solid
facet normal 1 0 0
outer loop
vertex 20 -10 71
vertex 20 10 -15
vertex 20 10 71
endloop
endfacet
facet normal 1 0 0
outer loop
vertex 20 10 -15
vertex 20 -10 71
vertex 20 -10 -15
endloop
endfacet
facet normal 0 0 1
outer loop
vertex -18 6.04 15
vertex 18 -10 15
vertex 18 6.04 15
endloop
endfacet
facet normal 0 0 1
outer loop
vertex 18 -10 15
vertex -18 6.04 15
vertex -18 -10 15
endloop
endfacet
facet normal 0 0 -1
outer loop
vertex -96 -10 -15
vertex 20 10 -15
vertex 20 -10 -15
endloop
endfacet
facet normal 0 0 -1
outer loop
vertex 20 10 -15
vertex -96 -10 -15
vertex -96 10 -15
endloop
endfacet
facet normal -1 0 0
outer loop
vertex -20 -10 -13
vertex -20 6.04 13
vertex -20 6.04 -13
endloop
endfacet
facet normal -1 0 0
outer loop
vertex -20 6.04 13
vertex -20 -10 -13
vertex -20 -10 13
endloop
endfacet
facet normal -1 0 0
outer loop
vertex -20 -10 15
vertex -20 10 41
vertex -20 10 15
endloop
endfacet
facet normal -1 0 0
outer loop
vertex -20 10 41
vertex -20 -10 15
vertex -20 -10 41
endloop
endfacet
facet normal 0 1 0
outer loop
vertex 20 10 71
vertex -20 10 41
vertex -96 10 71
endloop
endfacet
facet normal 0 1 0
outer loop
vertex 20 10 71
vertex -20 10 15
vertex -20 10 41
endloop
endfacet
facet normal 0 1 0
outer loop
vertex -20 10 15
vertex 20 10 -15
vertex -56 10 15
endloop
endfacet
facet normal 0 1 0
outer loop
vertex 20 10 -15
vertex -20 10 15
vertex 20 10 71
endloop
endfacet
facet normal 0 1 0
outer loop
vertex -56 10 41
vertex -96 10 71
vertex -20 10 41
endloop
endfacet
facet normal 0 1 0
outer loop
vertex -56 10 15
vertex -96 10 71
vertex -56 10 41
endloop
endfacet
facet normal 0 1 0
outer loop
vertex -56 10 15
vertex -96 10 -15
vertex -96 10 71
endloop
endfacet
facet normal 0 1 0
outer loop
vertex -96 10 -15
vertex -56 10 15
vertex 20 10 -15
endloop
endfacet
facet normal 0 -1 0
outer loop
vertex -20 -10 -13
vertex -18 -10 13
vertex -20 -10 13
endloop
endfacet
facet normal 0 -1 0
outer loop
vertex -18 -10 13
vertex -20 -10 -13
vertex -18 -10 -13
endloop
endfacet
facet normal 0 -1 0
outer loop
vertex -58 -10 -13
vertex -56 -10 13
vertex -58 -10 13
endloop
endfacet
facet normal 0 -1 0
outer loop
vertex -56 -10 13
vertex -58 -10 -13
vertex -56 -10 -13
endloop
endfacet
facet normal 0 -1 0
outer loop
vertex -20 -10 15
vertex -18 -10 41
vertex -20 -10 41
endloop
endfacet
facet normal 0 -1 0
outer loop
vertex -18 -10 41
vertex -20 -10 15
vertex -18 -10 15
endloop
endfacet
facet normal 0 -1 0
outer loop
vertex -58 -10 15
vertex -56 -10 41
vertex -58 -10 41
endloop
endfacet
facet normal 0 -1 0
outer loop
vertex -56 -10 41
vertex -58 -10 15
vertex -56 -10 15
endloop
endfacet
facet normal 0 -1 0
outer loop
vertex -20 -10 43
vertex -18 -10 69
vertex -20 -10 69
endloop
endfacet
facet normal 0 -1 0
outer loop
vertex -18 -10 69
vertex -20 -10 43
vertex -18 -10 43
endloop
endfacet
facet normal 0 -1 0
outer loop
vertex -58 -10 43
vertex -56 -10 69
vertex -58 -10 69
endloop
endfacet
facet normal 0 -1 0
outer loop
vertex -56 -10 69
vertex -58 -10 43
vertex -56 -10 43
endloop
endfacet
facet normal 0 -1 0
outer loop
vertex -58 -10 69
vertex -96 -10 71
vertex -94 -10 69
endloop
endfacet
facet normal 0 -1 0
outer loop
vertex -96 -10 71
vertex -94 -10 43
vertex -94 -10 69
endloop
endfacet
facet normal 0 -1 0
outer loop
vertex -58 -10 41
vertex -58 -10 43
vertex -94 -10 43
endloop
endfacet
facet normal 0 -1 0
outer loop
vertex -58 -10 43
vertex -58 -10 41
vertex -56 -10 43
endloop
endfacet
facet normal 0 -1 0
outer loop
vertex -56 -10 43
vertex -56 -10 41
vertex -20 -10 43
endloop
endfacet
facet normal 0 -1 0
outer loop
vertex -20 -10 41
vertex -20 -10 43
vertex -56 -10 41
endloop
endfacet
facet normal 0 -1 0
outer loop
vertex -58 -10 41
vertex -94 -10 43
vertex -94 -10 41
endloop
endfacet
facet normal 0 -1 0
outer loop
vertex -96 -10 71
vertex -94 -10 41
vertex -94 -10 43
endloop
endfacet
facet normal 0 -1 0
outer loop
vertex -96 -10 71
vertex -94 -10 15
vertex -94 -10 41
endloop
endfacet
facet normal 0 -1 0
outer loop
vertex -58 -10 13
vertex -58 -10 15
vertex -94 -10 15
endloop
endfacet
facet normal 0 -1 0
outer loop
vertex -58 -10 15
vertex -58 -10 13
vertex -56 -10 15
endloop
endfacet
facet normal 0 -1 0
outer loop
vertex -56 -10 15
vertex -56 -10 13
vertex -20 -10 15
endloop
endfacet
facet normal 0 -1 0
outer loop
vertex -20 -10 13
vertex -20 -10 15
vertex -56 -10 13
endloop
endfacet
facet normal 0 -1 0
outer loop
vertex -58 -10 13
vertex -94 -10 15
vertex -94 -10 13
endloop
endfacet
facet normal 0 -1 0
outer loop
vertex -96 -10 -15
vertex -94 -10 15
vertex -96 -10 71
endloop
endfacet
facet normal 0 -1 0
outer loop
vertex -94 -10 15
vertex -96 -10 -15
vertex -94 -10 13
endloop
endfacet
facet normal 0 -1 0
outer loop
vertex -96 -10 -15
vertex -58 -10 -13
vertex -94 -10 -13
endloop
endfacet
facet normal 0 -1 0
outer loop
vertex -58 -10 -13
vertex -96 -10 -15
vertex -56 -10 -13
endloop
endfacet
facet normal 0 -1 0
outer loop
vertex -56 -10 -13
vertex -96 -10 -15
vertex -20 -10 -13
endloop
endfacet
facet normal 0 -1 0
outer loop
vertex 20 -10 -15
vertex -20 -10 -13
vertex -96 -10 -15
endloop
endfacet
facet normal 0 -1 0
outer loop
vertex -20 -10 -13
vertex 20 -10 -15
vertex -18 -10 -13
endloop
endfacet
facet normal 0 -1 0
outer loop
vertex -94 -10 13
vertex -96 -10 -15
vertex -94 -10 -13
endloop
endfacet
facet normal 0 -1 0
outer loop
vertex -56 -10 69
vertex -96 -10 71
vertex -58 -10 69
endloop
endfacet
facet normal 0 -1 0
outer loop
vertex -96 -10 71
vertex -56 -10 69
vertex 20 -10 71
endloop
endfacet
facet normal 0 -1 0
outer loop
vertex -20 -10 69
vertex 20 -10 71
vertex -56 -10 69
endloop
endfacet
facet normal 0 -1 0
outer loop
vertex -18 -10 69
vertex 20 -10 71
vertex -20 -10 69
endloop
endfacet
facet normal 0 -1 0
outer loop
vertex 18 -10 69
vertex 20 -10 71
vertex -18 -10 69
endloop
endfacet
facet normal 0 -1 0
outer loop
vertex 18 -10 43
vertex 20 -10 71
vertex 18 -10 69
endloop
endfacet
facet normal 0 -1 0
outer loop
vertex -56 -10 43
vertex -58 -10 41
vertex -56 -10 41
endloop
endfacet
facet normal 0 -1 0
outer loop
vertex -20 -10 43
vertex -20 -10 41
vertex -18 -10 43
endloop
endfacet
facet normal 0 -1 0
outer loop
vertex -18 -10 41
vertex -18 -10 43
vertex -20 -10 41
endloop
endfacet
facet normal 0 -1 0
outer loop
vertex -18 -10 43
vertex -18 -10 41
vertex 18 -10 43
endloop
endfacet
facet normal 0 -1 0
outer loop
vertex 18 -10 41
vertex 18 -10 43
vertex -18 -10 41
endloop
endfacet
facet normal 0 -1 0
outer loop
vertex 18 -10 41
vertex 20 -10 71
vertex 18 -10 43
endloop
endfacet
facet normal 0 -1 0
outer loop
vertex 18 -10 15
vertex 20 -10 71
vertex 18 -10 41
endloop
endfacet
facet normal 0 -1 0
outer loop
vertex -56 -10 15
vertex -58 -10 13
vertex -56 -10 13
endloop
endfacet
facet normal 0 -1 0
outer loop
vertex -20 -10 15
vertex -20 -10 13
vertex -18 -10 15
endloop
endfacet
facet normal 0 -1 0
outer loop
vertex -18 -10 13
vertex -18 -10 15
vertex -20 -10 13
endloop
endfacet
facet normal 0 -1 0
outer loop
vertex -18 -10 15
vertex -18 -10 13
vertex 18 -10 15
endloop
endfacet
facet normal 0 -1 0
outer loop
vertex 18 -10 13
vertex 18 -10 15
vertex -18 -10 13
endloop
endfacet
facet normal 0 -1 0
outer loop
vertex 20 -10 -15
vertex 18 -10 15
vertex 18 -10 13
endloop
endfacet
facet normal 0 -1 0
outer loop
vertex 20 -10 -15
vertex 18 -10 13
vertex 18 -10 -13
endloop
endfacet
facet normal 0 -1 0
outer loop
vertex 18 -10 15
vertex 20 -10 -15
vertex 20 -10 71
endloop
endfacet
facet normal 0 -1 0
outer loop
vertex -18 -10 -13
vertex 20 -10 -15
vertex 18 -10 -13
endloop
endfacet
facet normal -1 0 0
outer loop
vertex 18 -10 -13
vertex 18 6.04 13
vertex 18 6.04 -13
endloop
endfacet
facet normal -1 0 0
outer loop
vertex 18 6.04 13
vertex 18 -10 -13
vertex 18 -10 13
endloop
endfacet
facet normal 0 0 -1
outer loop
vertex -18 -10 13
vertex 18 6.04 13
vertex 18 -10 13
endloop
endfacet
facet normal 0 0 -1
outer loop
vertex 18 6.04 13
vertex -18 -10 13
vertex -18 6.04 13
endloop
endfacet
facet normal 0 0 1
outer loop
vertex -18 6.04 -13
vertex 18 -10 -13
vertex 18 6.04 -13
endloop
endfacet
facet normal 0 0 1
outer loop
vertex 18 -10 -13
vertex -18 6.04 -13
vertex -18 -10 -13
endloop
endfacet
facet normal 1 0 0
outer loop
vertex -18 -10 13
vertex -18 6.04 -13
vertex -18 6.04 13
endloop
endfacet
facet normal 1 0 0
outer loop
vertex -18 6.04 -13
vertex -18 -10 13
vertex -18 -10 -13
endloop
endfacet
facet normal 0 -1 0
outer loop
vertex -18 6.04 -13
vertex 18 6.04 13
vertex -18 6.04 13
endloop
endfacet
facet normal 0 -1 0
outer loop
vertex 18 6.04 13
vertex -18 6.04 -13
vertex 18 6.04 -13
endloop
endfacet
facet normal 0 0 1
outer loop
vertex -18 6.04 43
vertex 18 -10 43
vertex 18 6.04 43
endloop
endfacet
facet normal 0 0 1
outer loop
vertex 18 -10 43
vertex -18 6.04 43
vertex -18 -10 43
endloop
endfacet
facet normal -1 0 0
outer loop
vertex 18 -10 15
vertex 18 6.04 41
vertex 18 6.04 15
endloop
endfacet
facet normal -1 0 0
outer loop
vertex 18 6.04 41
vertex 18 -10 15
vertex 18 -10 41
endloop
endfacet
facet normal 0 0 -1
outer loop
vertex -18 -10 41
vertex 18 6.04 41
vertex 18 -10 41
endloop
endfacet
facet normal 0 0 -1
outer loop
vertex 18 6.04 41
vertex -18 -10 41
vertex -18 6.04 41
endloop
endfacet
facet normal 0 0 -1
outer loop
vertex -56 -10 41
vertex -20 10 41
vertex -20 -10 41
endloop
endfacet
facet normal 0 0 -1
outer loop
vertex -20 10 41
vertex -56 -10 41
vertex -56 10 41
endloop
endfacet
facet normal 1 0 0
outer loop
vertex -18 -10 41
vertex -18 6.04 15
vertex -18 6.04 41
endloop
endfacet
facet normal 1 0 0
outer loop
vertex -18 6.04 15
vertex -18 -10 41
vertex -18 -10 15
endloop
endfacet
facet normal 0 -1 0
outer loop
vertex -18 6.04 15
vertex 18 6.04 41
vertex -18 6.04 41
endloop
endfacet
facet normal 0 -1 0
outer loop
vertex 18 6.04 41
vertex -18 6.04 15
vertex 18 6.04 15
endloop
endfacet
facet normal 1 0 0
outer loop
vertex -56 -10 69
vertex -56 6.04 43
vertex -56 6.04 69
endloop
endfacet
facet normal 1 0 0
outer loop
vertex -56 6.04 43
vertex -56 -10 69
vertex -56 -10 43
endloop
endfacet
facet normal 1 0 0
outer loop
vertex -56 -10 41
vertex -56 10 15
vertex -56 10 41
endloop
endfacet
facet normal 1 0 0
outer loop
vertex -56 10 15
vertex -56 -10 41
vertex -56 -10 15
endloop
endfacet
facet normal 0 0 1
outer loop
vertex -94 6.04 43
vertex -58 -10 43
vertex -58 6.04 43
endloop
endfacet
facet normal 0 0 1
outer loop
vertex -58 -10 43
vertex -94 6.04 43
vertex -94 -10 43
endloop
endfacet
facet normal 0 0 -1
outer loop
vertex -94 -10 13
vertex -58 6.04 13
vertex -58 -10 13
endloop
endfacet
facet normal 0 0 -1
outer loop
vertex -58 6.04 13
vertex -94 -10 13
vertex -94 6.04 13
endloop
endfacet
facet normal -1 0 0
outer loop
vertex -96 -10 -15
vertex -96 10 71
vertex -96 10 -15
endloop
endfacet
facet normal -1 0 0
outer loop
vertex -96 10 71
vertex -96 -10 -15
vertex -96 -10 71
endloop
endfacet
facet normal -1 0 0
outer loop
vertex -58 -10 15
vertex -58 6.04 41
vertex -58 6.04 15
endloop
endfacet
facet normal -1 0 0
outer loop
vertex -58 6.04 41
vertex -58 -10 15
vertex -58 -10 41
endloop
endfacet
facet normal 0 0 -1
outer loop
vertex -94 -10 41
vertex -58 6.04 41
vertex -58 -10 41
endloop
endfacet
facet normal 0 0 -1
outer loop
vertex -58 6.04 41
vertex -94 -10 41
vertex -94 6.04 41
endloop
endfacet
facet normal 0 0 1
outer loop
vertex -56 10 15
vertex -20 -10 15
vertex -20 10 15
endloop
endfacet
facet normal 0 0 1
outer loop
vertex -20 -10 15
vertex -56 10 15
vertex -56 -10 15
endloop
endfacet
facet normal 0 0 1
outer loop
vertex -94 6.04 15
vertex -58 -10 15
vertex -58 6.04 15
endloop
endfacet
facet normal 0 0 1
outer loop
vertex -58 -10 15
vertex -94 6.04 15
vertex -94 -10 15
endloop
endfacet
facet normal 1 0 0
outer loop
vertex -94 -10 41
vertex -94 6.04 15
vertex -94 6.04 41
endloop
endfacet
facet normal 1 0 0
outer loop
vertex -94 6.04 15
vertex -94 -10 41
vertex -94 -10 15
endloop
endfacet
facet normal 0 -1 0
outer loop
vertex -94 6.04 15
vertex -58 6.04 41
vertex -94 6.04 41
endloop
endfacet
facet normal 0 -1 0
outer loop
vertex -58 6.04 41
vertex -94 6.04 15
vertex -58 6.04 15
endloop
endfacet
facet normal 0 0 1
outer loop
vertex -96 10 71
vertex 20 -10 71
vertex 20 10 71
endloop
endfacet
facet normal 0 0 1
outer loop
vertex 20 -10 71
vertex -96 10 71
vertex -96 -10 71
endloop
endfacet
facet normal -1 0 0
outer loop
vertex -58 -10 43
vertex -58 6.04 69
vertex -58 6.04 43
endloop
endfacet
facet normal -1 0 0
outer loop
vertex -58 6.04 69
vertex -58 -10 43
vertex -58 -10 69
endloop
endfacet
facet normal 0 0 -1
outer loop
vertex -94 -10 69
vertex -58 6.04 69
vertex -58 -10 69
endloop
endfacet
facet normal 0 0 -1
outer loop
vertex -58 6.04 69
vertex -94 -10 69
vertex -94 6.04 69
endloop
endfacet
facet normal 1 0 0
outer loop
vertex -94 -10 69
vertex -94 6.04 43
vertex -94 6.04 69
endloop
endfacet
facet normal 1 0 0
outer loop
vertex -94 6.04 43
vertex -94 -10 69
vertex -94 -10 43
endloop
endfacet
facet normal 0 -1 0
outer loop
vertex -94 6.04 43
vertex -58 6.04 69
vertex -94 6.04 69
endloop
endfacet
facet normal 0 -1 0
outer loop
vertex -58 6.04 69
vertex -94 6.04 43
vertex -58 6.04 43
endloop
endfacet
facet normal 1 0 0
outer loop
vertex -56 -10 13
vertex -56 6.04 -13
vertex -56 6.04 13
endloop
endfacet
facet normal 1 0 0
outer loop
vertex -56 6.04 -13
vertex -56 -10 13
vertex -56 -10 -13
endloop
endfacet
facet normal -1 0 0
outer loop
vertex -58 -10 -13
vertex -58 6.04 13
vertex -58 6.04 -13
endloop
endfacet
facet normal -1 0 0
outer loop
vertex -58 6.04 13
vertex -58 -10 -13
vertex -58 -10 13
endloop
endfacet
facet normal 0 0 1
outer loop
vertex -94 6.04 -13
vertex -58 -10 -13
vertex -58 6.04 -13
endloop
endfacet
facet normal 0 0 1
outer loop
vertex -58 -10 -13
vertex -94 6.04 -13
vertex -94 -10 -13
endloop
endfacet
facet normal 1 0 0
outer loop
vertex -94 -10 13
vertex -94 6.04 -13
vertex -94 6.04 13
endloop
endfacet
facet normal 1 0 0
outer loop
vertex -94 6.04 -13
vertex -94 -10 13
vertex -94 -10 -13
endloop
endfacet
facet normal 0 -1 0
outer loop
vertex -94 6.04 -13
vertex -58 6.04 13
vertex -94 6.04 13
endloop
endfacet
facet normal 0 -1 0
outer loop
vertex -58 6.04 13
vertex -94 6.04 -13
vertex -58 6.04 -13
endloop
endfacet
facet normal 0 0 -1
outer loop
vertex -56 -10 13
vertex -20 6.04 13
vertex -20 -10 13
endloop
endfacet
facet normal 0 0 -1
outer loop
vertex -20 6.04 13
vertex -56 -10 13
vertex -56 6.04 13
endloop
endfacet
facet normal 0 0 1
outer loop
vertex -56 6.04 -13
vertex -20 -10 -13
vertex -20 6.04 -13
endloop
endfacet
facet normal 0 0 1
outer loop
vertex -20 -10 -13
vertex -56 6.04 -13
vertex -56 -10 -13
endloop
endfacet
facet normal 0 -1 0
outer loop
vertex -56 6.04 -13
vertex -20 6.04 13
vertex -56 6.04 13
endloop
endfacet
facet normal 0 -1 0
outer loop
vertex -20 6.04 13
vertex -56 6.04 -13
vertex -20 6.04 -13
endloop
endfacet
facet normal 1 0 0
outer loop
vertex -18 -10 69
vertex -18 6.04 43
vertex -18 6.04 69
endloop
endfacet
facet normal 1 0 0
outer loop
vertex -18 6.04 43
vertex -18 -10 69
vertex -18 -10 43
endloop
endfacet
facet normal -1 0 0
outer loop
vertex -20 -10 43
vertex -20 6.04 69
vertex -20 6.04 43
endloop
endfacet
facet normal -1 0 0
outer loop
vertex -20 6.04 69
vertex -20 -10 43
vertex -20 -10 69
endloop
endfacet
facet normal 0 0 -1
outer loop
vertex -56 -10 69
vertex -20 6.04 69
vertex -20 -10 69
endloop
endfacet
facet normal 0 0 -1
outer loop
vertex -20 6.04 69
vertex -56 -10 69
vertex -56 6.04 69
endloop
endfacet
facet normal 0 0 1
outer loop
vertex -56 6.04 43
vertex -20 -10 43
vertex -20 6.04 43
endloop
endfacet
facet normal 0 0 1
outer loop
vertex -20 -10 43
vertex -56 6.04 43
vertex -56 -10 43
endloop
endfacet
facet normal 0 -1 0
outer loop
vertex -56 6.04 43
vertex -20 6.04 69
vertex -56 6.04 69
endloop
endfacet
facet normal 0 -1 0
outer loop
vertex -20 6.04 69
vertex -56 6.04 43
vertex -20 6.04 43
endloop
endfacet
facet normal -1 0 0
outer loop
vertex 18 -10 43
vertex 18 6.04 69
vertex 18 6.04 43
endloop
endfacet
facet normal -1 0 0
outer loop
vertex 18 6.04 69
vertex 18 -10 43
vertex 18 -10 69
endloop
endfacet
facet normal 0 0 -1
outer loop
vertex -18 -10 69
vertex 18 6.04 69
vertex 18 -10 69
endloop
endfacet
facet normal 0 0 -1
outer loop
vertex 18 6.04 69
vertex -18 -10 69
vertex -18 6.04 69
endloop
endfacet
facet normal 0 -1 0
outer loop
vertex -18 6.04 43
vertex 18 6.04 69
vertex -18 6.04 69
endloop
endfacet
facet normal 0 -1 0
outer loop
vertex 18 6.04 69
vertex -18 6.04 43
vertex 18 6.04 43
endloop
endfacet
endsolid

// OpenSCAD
// GENERATEUR DE CARRE DE NICHES - Gilbert Duval 2021

largeur = 40;
hauteur = 30;
profondeur = 20;
epaisseur = 4;
avecFond = true;
nbParCote = 2;
uniteV = (largeur - epaisseur/2);
uniteH = (hauteur - epaisseur/2);

colonne(nbParCote);
translate([-nbParCote * uniteV, 0, uniteH])colonne(nbParCote);
translate([-nbParCote * uniteV, 0, 0])ligne(nbParCote);
translate([(-nbParCote+1) * uniteV, 0, nbParCote * uniteH])ligne(nbParCote);

module colonne (n) {  
  for( i = [1 : n])translate([0, 0, (i-1) * uniteH])niche();
}
module ligne (n) {
  for( i = [1 : n])translate([(i-1) * uniteV, 0, 0])niche();
}
module niche() {
  difference() {
    cube(size = [largeur, profondeur, hauteur], center = true);
    translate([0, avecFond ? -epaisseur : 0, 0])
      cube(size = [largeur - epaisseur, profondeur + 0.081,
                   hauteur - epaisseur], center = true);
  }
}
